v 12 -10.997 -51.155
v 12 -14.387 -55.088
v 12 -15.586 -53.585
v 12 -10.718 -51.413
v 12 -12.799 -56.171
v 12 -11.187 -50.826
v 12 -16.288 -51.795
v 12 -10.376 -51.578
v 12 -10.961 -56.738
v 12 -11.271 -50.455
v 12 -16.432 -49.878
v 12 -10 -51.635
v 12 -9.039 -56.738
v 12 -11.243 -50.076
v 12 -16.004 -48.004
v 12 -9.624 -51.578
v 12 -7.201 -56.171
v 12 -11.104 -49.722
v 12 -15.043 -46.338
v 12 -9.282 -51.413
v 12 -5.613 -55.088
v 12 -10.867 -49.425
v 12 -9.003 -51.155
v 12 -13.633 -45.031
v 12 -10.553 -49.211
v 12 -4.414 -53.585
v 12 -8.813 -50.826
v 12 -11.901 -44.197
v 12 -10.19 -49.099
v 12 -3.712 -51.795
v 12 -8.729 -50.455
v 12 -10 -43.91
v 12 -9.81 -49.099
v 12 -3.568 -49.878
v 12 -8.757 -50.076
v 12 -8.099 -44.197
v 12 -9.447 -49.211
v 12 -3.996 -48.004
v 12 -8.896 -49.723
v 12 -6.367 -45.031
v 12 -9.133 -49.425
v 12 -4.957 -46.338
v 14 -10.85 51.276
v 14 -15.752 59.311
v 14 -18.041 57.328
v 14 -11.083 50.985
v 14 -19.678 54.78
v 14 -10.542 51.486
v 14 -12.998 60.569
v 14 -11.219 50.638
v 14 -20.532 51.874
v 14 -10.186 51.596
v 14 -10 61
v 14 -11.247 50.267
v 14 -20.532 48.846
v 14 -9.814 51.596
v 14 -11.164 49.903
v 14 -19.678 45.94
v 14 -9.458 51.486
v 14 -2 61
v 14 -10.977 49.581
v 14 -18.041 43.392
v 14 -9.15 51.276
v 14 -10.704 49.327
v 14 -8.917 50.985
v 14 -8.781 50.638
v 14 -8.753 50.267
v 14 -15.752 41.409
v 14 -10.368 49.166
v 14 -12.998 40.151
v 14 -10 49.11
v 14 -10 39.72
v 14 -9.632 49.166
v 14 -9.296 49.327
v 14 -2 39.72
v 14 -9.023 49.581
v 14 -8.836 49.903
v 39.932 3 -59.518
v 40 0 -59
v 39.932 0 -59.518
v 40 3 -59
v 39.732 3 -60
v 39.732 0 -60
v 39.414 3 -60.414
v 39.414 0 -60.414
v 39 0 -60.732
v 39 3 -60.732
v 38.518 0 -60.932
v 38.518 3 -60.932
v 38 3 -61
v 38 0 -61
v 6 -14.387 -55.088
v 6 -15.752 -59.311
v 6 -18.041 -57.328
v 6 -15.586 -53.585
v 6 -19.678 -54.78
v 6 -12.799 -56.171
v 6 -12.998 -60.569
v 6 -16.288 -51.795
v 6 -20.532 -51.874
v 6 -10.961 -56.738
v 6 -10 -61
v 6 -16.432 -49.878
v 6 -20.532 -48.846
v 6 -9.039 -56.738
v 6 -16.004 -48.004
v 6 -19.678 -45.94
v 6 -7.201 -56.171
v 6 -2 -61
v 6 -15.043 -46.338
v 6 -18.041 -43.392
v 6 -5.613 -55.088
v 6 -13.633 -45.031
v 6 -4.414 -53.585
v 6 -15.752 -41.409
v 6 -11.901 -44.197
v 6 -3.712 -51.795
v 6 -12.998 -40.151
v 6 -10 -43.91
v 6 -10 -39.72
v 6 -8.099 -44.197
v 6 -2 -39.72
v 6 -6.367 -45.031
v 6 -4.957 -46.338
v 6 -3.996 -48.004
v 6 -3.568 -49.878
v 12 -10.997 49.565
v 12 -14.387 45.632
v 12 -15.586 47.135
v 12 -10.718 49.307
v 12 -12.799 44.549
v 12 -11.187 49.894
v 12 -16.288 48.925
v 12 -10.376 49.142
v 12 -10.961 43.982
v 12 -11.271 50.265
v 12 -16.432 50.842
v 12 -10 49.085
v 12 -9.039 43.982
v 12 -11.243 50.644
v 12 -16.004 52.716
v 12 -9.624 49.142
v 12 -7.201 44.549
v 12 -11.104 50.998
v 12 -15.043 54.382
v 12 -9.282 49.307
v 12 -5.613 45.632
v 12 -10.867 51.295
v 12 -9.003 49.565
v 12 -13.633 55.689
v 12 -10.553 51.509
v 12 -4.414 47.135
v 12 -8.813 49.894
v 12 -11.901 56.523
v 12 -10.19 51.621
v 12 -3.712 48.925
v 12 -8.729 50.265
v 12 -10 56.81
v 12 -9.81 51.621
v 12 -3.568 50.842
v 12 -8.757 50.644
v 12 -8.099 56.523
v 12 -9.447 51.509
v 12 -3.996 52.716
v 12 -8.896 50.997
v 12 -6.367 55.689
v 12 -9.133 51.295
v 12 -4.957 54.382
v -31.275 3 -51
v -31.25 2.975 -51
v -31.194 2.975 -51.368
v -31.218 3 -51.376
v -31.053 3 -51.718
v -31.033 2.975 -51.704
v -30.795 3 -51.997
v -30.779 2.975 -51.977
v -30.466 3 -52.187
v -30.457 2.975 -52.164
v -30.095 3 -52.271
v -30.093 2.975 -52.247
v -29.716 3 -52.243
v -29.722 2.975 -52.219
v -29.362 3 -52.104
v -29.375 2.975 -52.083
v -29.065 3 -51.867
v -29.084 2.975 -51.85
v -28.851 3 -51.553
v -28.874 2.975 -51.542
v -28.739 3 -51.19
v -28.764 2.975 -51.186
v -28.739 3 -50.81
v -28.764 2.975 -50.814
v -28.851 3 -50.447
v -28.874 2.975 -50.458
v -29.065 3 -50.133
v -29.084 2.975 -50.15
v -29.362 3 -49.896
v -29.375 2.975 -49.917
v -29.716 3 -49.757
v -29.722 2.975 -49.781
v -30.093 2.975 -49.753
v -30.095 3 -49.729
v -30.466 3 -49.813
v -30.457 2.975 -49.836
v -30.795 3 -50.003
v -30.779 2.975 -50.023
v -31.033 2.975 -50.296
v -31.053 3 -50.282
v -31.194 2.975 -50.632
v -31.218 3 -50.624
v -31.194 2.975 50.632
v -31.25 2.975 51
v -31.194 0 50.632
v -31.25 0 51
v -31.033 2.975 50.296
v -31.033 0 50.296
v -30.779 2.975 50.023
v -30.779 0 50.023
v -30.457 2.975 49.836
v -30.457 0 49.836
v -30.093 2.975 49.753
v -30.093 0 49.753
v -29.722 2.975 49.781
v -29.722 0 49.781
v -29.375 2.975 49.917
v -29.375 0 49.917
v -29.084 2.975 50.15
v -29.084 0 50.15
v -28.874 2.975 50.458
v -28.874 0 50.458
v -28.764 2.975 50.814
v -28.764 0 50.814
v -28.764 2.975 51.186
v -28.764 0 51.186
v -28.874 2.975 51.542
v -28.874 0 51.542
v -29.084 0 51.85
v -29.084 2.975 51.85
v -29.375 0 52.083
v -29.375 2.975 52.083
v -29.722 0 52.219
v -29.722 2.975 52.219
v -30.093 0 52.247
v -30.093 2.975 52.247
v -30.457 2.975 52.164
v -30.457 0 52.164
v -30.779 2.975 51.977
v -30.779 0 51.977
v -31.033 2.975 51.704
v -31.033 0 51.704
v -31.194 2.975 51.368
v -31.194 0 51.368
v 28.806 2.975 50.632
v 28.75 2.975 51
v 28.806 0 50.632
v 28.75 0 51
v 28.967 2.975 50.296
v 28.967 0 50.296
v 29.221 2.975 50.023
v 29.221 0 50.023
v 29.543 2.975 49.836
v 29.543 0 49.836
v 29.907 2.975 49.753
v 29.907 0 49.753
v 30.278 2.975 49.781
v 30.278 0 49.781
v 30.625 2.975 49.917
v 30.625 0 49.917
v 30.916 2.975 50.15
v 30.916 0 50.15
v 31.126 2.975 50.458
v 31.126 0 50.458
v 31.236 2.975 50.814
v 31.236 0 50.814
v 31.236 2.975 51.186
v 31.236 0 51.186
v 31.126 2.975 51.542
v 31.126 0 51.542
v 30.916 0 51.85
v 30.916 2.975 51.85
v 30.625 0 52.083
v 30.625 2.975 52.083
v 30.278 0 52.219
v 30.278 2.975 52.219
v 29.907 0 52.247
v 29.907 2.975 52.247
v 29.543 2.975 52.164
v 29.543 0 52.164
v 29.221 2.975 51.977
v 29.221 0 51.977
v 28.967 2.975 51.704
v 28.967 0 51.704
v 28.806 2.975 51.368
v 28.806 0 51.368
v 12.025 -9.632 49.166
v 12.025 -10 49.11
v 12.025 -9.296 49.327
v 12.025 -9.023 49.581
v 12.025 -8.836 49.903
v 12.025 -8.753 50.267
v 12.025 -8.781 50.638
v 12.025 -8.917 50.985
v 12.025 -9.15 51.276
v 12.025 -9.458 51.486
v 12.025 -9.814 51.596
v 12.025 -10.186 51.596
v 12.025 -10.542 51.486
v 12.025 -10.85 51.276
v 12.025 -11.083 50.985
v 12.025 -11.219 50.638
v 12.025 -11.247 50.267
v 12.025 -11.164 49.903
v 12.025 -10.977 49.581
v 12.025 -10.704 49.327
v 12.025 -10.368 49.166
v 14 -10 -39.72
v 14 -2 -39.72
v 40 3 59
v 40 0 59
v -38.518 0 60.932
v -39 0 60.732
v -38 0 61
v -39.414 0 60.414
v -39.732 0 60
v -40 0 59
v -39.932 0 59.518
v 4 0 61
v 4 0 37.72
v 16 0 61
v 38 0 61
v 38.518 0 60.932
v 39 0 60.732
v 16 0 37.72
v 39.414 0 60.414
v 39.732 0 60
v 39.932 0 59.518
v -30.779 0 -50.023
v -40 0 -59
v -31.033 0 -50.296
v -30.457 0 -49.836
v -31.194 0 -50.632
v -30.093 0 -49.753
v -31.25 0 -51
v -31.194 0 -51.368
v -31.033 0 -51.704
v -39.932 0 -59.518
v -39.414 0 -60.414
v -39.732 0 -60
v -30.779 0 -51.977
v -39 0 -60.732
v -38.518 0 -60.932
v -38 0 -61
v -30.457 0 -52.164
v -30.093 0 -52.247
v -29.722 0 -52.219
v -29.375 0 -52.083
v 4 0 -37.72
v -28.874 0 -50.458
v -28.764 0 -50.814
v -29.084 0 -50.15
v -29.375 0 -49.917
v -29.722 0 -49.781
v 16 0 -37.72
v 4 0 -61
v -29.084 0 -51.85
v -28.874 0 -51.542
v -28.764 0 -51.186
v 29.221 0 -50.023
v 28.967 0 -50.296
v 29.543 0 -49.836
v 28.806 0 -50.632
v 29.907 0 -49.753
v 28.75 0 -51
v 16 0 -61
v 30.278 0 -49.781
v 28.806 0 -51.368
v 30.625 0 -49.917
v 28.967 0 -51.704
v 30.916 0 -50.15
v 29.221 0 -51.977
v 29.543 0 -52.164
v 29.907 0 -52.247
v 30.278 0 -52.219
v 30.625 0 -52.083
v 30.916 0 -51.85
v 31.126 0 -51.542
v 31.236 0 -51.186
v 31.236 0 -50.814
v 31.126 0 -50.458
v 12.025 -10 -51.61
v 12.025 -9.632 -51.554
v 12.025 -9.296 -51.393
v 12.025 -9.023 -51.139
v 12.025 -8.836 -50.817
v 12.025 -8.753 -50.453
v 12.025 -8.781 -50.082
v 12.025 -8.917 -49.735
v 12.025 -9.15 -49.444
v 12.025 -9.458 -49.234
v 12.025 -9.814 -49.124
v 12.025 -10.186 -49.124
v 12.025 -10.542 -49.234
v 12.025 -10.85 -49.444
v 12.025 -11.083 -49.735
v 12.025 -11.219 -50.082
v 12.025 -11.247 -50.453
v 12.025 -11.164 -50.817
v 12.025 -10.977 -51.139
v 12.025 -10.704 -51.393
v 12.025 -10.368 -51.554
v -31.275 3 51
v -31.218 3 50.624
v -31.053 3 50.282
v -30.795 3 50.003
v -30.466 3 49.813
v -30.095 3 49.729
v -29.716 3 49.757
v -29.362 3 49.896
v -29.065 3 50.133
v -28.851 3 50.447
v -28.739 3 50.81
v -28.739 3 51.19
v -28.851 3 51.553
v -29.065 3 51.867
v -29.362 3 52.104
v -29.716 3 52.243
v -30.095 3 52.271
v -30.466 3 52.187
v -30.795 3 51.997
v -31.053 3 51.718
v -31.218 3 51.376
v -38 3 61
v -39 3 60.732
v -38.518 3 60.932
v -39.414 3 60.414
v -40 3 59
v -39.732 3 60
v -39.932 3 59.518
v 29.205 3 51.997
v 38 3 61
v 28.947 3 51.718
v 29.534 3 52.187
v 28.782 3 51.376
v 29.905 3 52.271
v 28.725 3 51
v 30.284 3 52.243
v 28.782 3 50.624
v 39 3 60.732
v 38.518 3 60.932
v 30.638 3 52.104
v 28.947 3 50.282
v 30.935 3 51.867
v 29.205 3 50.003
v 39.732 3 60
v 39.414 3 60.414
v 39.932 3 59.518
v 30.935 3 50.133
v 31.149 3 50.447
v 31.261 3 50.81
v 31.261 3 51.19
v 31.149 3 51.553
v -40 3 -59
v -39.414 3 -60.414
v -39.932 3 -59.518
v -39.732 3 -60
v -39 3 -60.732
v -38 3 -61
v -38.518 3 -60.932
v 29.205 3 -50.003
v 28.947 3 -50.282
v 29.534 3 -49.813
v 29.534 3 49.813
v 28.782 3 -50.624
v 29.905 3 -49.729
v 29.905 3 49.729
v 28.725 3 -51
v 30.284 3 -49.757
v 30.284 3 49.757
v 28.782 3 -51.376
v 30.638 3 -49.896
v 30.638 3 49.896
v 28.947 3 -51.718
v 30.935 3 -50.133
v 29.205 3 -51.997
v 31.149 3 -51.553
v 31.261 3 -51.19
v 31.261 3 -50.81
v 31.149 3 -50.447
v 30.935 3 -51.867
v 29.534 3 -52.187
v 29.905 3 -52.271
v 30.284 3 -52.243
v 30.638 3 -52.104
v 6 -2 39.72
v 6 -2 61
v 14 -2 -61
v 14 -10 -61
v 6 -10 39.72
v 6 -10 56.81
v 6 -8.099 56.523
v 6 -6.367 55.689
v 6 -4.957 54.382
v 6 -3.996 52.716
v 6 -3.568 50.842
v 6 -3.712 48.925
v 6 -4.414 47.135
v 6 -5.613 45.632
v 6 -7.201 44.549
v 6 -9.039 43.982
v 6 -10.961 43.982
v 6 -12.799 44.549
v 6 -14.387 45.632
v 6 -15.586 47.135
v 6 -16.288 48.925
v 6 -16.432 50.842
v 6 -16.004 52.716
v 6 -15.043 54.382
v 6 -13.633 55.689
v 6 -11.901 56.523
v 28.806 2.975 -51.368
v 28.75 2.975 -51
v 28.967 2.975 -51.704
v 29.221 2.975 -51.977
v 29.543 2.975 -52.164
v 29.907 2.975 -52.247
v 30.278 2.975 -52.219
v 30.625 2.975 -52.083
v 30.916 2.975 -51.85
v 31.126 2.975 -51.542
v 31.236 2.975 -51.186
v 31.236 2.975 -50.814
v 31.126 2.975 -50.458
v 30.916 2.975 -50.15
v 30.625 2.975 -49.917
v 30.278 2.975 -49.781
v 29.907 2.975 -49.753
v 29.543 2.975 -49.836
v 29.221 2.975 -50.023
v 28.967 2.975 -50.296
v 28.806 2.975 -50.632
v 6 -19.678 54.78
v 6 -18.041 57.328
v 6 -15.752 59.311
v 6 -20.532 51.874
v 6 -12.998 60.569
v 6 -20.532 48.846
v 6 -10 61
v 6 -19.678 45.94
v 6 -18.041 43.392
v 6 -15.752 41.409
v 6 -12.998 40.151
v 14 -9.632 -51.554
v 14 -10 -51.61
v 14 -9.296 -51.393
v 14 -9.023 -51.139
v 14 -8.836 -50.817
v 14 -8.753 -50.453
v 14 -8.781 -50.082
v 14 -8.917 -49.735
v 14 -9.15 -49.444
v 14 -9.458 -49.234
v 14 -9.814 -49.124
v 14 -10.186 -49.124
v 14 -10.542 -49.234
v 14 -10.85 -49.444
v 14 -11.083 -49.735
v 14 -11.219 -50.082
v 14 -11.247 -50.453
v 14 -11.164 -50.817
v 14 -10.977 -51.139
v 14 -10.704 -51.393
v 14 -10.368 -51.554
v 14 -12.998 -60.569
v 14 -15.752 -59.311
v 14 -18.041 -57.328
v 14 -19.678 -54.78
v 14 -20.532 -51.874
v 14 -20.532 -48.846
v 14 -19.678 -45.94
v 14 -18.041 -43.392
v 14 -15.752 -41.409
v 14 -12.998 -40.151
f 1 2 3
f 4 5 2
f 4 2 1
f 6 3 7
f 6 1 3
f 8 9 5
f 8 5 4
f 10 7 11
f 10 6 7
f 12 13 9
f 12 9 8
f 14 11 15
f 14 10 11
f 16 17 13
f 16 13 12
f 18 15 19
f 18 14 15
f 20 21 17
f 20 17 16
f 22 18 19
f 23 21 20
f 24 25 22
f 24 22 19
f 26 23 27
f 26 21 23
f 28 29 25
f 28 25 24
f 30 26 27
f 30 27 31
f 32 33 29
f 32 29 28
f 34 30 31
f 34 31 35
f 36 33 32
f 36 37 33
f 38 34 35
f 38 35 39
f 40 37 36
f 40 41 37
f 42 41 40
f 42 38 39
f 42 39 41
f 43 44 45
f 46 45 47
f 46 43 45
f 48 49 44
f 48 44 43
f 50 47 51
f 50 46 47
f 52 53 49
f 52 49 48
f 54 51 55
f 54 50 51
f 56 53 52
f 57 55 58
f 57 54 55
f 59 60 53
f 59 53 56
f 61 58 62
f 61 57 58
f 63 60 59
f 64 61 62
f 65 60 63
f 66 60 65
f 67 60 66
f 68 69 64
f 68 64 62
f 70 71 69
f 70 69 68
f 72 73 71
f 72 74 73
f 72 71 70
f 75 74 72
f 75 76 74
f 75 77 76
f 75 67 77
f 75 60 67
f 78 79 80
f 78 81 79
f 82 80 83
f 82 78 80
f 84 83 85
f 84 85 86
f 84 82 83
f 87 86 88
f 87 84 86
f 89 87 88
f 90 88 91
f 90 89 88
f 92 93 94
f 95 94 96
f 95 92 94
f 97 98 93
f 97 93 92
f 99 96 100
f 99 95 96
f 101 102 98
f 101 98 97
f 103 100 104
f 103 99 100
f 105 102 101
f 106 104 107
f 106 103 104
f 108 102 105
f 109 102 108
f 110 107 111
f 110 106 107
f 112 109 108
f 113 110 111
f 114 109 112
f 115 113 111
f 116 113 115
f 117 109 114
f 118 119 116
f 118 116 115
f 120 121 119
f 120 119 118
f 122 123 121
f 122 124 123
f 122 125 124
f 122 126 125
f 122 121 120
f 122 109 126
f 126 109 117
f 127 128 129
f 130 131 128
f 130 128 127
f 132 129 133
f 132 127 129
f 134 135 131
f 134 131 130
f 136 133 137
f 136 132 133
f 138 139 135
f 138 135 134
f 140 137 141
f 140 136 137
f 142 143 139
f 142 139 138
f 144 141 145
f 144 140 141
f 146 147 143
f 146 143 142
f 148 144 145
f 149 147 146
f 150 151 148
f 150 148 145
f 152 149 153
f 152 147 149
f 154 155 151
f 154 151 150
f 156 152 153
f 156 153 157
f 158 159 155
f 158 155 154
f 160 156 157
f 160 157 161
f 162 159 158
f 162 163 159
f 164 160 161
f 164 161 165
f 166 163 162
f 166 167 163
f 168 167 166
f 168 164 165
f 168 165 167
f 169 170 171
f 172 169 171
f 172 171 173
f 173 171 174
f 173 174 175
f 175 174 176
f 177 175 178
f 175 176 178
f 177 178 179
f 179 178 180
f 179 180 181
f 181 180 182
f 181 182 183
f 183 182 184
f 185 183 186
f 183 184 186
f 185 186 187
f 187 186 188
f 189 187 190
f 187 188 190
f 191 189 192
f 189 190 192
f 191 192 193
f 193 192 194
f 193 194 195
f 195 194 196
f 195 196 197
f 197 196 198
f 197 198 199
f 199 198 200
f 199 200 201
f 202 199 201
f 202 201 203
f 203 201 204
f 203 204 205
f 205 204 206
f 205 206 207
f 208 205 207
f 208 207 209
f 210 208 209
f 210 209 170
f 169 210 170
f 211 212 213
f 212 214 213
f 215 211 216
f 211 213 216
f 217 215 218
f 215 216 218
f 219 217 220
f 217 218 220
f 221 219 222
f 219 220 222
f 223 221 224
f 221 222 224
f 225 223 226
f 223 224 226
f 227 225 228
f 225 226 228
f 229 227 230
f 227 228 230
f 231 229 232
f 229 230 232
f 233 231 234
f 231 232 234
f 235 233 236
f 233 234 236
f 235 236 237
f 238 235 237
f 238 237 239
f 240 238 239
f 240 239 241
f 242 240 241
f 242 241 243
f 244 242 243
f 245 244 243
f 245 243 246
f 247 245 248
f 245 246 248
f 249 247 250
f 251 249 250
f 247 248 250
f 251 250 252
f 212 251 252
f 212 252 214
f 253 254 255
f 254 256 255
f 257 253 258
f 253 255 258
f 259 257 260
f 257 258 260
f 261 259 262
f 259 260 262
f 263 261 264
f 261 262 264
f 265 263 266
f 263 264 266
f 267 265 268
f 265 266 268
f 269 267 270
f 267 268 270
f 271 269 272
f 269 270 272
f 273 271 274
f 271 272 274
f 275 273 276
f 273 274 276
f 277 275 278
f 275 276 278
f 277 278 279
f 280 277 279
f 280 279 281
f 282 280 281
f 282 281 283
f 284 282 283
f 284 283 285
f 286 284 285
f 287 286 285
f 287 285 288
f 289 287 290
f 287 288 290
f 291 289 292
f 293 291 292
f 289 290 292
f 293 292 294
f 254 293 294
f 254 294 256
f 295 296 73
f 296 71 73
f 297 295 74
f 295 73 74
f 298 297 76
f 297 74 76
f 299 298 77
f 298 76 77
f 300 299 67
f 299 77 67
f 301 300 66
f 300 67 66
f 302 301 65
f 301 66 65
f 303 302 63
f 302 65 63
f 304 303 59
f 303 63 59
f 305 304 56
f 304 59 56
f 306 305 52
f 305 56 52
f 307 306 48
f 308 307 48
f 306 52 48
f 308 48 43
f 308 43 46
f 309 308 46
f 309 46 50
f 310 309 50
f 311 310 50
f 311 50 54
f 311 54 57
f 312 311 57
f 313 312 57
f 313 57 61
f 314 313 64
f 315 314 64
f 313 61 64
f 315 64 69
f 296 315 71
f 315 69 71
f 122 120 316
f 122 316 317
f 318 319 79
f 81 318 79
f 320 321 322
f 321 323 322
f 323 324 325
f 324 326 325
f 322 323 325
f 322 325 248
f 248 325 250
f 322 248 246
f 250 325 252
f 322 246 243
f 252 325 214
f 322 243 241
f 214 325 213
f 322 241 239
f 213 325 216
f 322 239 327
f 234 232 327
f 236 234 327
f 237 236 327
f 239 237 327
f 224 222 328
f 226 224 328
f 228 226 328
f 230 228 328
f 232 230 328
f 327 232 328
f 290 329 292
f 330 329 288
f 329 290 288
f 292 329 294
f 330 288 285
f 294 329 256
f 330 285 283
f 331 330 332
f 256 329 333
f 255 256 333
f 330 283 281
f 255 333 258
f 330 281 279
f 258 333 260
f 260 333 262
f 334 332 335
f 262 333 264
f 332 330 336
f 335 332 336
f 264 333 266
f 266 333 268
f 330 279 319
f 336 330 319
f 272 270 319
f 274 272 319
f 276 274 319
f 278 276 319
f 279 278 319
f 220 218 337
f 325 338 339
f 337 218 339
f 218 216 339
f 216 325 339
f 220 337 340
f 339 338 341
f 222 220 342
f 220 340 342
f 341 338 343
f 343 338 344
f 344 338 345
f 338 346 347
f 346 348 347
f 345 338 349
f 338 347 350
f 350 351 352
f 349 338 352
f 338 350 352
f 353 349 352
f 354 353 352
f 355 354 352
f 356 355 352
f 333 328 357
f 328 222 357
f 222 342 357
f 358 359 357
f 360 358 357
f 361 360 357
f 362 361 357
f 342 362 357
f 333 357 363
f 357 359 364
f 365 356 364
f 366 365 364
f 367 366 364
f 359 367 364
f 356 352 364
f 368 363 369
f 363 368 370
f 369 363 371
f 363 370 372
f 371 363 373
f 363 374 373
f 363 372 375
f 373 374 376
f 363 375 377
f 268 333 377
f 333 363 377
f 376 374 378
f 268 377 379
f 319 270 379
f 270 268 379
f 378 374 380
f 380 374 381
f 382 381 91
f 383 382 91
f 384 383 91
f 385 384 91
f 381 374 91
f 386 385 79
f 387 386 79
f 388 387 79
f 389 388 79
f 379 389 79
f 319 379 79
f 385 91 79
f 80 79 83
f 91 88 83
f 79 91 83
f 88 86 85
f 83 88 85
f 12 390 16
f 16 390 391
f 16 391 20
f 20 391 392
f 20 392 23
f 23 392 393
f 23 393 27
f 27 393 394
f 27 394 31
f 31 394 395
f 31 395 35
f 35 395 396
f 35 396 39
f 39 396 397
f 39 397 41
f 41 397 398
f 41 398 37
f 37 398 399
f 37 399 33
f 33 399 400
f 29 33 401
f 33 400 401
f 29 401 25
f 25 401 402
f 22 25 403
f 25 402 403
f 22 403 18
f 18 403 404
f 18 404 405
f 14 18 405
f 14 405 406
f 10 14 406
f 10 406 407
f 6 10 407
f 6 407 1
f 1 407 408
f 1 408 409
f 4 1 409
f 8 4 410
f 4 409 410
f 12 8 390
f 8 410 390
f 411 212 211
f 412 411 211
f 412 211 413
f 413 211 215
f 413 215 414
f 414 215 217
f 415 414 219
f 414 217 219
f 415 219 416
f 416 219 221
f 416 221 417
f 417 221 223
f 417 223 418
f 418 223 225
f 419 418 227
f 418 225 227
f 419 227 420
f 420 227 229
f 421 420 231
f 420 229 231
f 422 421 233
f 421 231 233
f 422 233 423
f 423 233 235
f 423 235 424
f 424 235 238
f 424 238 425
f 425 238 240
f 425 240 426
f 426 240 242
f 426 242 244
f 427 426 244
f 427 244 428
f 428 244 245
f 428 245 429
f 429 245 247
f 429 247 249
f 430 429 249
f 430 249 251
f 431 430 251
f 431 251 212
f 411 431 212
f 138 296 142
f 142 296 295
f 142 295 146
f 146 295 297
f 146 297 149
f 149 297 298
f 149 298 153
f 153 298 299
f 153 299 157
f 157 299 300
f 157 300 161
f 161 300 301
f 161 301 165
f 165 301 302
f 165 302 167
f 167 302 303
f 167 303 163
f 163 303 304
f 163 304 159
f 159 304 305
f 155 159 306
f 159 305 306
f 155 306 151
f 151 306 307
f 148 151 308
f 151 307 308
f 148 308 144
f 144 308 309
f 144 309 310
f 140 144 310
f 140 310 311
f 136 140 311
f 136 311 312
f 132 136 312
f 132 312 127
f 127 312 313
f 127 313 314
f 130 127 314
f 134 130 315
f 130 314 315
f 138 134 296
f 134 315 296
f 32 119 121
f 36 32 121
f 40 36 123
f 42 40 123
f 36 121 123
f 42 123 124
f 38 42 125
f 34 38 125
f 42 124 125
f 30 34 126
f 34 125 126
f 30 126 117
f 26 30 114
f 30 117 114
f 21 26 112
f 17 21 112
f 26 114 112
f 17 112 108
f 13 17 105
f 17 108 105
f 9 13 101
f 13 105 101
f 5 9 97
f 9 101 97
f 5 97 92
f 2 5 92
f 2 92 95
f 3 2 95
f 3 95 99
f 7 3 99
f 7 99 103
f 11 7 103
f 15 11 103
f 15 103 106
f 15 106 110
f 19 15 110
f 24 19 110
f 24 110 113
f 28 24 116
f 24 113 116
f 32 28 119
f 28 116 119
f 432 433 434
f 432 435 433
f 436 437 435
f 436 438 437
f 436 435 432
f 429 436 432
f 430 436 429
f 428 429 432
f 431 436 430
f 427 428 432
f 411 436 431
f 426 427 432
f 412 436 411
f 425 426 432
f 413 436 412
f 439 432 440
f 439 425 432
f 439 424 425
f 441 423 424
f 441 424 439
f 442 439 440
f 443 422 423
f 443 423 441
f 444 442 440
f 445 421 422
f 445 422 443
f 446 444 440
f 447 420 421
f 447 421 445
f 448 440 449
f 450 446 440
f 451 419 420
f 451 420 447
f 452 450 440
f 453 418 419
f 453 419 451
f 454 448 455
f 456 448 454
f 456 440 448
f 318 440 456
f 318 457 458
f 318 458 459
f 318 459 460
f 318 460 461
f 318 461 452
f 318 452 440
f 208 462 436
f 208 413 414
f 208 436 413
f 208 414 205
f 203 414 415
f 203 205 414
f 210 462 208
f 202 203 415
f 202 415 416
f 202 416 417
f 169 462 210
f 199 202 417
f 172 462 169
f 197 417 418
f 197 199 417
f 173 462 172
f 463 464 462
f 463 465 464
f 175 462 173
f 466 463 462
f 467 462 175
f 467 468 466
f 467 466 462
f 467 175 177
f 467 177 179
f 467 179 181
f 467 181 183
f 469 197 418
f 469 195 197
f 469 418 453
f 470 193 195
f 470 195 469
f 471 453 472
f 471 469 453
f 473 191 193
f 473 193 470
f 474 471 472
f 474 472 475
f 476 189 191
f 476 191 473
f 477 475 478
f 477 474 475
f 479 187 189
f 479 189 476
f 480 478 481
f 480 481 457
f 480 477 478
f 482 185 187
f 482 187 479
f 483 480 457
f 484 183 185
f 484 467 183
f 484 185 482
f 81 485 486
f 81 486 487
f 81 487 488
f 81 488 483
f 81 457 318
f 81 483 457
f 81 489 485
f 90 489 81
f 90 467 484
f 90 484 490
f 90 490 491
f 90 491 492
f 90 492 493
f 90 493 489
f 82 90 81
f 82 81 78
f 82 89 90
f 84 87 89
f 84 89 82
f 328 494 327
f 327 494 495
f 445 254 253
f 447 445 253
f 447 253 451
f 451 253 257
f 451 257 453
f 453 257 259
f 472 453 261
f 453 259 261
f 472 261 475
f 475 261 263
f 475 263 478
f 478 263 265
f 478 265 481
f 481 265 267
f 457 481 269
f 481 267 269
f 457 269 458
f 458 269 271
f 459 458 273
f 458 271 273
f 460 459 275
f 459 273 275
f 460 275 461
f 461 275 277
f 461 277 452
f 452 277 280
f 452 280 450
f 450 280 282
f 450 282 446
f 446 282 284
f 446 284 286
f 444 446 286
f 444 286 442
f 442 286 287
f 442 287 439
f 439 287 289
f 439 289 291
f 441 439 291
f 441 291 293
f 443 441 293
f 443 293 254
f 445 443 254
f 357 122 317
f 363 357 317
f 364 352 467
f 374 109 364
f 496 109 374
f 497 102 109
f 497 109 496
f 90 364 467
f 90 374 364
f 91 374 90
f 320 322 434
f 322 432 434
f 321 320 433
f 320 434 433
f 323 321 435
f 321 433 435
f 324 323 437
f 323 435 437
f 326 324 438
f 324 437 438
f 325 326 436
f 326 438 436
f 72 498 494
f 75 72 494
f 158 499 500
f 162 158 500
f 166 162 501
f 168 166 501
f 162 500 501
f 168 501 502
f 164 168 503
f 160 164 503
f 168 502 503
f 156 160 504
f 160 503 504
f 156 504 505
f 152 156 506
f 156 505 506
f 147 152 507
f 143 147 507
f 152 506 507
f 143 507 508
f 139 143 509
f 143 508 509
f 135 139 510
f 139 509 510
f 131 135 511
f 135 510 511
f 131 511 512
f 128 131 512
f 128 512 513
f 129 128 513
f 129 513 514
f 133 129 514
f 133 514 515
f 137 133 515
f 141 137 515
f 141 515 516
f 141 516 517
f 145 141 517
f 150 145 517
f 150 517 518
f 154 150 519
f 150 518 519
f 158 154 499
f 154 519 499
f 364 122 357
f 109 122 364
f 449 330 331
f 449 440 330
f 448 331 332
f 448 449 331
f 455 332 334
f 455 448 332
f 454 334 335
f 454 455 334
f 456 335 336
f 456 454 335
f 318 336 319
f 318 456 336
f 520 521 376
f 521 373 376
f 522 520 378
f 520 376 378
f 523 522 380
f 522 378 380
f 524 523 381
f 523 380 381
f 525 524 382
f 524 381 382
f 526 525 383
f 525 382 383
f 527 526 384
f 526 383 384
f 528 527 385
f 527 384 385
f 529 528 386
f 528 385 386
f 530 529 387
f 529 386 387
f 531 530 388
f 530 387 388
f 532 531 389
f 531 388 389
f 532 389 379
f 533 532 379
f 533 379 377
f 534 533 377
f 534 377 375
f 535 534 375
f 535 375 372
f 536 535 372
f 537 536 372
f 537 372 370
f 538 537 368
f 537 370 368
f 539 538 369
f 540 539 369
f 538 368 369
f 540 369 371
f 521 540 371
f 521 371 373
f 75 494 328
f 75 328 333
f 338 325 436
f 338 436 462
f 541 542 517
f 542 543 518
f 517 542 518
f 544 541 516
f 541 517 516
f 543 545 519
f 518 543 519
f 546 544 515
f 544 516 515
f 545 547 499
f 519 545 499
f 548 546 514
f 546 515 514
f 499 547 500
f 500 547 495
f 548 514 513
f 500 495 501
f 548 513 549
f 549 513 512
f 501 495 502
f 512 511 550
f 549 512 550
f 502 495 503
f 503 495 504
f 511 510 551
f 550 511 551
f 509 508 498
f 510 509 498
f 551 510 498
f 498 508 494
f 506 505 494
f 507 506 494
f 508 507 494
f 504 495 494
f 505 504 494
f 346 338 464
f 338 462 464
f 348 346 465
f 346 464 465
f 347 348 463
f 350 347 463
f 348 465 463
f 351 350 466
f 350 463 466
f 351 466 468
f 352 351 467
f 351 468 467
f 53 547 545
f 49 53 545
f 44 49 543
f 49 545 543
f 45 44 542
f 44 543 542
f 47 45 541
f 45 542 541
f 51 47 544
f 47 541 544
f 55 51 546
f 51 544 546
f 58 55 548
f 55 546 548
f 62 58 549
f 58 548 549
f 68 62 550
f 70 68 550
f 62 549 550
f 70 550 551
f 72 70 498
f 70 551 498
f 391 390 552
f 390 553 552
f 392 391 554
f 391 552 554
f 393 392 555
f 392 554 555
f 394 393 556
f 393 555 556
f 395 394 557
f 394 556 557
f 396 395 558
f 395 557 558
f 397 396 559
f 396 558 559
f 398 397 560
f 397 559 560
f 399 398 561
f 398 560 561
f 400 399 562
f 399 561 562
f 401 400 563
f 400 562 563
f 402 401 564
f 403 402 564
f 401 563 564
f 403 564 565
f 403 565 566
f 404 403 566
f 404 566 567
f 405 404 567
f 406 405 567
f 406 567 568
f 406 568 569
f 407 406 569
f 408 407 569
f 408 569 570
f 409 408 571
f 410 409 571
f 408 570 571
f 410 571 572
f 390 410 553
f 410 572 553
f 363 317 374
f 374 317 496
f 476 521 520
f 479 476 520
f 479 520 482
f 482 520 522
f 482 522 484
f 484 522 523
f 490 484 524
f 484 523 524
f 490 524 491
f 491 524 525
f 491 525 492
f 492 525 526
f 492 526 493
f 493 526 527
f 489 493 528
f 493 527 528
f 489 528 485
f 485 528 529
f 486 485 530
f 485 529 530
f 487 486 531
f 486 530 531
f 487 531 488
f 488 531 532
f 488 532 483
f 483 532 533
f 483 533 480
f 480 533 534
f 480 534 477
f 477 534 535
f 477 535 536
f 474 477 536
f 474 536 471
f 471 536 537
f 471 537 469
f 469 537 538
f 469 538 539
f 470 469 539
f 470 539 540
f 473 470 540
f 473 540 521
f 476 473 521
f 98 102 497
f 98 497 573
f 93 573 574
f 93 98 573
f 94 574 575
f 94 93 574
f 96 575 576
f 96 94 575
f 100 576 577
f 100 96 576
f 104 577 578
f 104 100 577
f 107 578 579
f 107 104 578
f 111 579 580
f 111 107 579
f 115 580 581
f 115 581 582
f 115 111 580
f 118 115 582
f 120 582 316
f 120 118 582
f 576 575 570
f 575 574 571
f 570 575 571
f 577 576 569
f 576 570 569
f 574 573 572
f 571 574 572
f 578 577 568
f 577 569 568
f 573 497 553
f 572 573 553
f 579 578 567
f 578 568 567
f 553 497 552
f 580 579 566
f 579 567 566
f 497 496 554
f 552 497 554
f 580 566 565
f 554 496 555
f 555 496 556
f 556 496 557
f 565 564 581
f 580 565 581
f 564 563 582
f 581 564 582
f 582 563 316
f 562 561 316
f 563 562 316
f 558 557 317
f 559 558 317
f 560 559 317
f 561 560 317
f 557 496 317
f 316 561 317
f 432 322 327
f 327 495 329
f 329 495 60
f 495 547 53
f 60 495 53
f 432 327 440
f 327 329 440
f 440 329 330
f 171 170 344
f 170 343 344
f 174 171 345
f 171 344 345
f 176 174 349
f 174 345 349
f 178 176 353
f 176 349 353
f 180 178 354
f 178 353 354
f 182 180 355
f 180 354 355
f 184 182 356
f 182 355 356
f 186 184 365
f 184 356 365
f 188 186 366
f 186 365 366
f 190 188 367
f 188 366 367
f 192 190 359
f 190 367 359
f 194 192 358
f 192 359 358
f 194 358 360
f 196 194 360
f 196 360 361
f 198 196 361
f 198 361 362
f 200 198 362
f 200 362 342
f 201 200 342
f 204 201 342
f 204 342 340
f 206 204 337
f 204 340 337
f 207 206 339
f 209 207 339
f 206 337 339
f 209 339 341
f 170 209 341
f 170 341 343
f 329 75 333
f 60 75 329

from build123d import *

# Parameters (mm, degrees)
SKETCH1_W                       = 80
SKETCH1_H                       = 122
BOSS_EXTRUDE1_DEPTH             = 3
BOSS_EXTRUDE2_DEPTH             = 8
SKETCH4_R                       = 6.45
CUT_EXTRUDE1_DEPTH              = 6
CHAMFER1_SIZE                   = 2
FILLET1_R                       = 2
F_2_5MM_DOWEL_HOLE1_D           = 2.5
F_2_5MM_DOWEL_HOLE1_DEPTH       = 5
F_2_5MM_DOWEL_HOLE1_CSINK_D     = 2.55
F_2_5MM_DOWEL_HOLE1_CSINK_ANGLE = 90
F_2_5MM_DOWEL_HOLE1_TIP         = 0.751075774
F_2_5MM_DOWEL_HOLE2_D           = 2.5
F_2_5MM_DOWEL_HOLE2_DEPTH       = 5
F_2_5MM_DOWEL_HOLE2_CSINK_D     = 2.55
F_2_5MM_DOWEL_HOLE2_CSINK_ANGLE = 90
F_2_5MM_DOWEL_HOLE2_TIP         = 0.751075774


with BuildPart() as part:
    # Sketch1 → Boss-Extrude1 (new body)
    with BuildSketch(Plane(origin=(0, 0, 0), x_dir=(1, 0, 0), z_dir=(0, 1, 0))):
        Rectangle(SKETCH1_W, SKETCH1_H)
    extrude(amount=BOSS_EXTRUDE1_DEPTH)

    # Sketch3 → Boss-Extrude2 (add)
    with BuildSketch(Plane(origin=(6, 0, 0), x_dir=(0, 0, -1), z_dir=(1, 0, 0))):
        with BuildLine():
            Line((-61, 0), (-61, -10))
            ThreePointArc((-61, -10), (-50.36, -20.64), (-39.72, -10))
            Line((-39.72, -10), (-39.72, 0))
            Line((-39.72, 0), (-61, 0))
        make_face()
        with BuildLine():
            Line((61, 0), (61, -10))
            ThreePointArc((61, -10), (50.36, -20.64), (39.72, -10))
            Line((39.72, -10), (39.72, 0))
            Line((39.72, 0), (61, 0))
        make_face()
    extrude(amount=BOSS_EXTRUDE2_DEPTH)

    # Sketch4 → Cut-Extrude1 (cut)
    with BuildSketch(Plane.ZY.offset(-6)):
        with Locations((-50.36, -10)):
            Circle(SKETCH4_R)
        with Locations((50.36, -10)):
            Circle(SKETCH4_R)
    extrude(amount=-CUT_EXTRUDE1_DEPTH, mode=Mode.SUBTRACT)

    # Chamfer1
    chamfer1_edges = [part.edges().sort_by_distance(p)[0] for p in [
        (6, 0, 50.36),
        (10, 0, 39.72),
        (14, 0, 50.36),
        (6, 0, -50.36),
        (10, 0, -39.72),
        (14, 0, -50.36),
    ]]
    chamfer(chamfer1_edges, length=CHAMFER1_SIZE)

    # Fillet1
    fillet1_edges = [part.edges().sort_by_distance(p)[0] for p in [
        (40, 1.5, 61),
        (-40, 1.5, 61),
        (-40, 1.5, -61),
        (40, 1.5, -61),
    ]]
    fillet(fillet1_edges, radius=FILLET1_R)

    # Ø2.5mm Dowel Hole1
    with Locations(Plane(origin=(0, 3, 0), x_dir=(1, 0, 0), z_dir=(0, 1, 0))):
        with Locations((-30, 51), (-30, -51), (30, -51), (30, 51)):
            CounterSinkHole(F_2_5MM_DOWEL_HOLE1_D / 2, F_2_5MM_DOWEL_HOLE1_CSINK_D / 2, depth=F_2_5MM_DOWEL_HOLE1_DEPTH, counter_sink_angle=F_2_5MM_DOWEL_HOLE1_CSINK_ANGLE)
            with Locations((0, 0, -(F_2_5MM_DOWEL_HOLE1_DEPTH + F_2_5MM_DOWEL_HOLE1_TIP / 2))):  # 118° drill point
                Cone(0, F_2_5MM_DOWEL_HOLE1_D / 2, F_2_5MM_DOWEL_HOLE1_TIP, mode=Mode.SUBTRACT)

    # Ø2.5mm Dowel Hole2
    with Locations(Plane.ZY.offset(-12)):
        with Locations((-50.36, -10), (50.36, -10)):
            CounterSinkHole(F_2_5MM_DOWEL_HOLE2_D / 2, F_2_5MM_DOWEL_HOLE2_CSINK_D / 2, depth=F_2_5MM_DOWEL_HOLE2_DEPTH, counter_sink_angle=F_2_5MM_DOWEL_HOLE2_CSINK_ANGLE)
            with Locations((0, 0, -(F_2_5MM_DOWEL_HOLE2_DEPTH + F_2_5MM_DOWEL_HOLE2_TIP / 2))):  # 118° drill point
                Cone(0, F_2_5MM_DOWEL_HOLE2_D / 2, F_2_5MM_DOWEL_HOLE2_TIP, mode=Mode.SUBTRACT)


solid = part.part
